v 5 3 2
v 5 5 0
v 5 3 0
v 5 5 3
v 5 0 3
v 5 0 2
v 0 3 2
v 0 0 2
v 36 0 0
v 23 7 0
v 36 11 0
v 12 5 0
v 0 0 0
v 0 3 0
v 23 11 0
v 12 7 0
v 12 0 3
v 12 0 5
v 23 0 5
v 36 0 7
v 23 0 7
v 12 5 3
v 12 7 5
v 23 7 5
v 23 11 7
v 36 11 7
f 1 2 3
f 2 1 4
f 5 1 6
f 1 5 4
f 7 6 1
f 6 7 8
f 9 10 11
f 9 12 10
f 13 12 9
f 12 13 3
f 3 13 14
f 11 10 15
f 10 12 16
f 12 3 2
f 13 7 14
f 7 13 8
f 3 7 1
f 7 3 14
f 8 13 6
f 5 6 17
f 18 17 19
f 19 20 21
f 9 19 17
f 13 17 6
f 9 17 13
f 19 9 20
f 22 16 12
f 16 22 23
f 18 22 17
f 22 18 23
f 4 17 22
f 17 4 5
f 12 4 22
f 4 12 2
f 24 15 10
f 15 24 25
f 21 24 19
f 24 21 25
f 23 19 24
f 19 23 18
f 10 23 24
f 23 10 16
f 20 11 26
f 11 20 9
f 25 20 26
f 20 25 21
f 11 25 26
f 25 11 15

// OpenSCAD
translate([2.5, 1.5, 1.0]) color([0.07533958521856021, 0.04464090542441246, 0.9342895823715677]) cube([5, 3, 2], center=true);
translate([2.5, 1.5, 1.0]) color([0.4861651007487351, 0.9010713996489047, 0.9447832518820701]) cube([5, 3, 2], center=true);
translate([2.5, 1.5, 1.0]) color([0.6665111524556335, 0.5717968260934746, 0.21597938410680917]) cube([5, 3, 2], center=true);
translate([2.5, 1.5, 1.0]) color([0.09347621929900818, 0.8193942150822732, 0.8887720676319878]) cube([5, 3, 2], center=true);
translate([2.5, 1.5, 1.0]) color([0.7793957106948857, 0.6985024327316249, 0.42011111607482077]) cube([5, 3, 2], center=true);
translate([2.5, 1.5, 1.0]) color([0.3053115900269564, 0.11344489563770899, 0.425970248072163]) cube([5, 3, 2], center=true);
translate([2.5, 1.5, 1.0]) color([0.5660129742477574, 0.9228805831375125, 0.9357547693309531]) cube([5, 3, 2], center=true);
translate([8.5, 2.5, 1.5]) color([0.41564119654091314, 0.0992109880980957, 0.7738187324714434]) cube([7, 5, 3], center=true);
translate([8.5, 2.5, 1.5]) color([0.7342793416571158, 0.03070084595190614, 0.4467185991338365]) cube([7, 5, 3], center=true);
translate([8.5, 2.5, 1.5]) color([0.6864181042985581, 0.030134234552269934, 0.9192823534016137]) cube([7, 5, 3], center=true);
translate([8.5, 2.5, 1.5]) color([0.9622424865104192, 0.72254277208884, 0.0785385396518038]) cube([7, 5, 3], center=true);
translate([8.5, 2.5, 1.5]) color([0.07032946587635569, 0.3592533148212369, 0.029377507756986443]) cube([7, 5, 3], center=true);
translate([8.5, 2.5, 1.5]) color([0.3478777272843395, 0.009964241312966027, 0.9743235128409679]) cube([7, 5, 3], center=true);
translate([8.5, 2.5, 1.5]) color([0.8190066990688627, 0.07051761147818736, 0.8934350918478603]) cube([7, 5, 3], center=true);
translate([8.5, 2.5, 1.5]) color([0.20797804000401565, 0.20479079826934998, 0.6737591455288341]) cube([7, 5, 3], center=true);
translate([8.5, 2.5, 1.5]) color([0.9382622681625481, 0.12318812122923739, 0.007184567252270457]) cube([7, 5, 3], center=true);
translate([8.5, 2.5, 1.5]) color([0.3691301471700257, 0.024650014436155776, 0.6048482375805311]) cube([7, 5, 3], center=true);
translate([8.5, 2.5, 1.5]) color([0.8591756086192088, 0.1869917024228578, 0.11239103583018406]) cube([7, 5, 3], center=true);
translate([17.5, 3.5, 2.5]) color([0.34444960733861085, 0.9591715206073138, 0.13015769442868408]) cube([11, 7, 5], center=true);
translate([17.5, 3.5, 2.5]) color([0.9665192604669938, 0.36223986994484925, 0.47337040276011155]) cube([11, 7, 5], center=true);
translate([17.5, 3.5, 2.5]) color([0.29263198596497353, 0.9371268442154698, 0.9581478949874975]) cube([11, 7, 5], center=true);
translate([17.5, 3.5, 2.5]) color([0.6359157065077434, 0.18404555017515556, 0.9929517886102871]) cube([11, 7, 5], center=true);
translate([17.5, 3.5, 2.5]) color([0.10258043954691198, 0.5808493815940804, 0.15640306008300875]) cube([11, 7, 5], center=true);
translate([17.5, 3.5, 2.5]) color([0.8976753141502056, 0.9456783914956152, 0.8043902980001079]) cube([11, 7, 5], center=true);
translate([17.5, 3.5, 2.5]) color([0.3158914186681244, 0.2428386899579852, 0.7548584132190378]) cube([11, 7, 5], center=true);
translate([17.5, 3.5, 2.5]) color([0.291059519145354, 0.4197853778540753, 0.04625567690264132]) cube([11, 7, 5], center=true);
translate([17.5, 3.5, 2.5]) color([0.13223381043380655, 0.020549620641776678, 0.0779211200935358]) cube([11, 7, 5], center=true);
translate([17.5, 3.5, 2.5]) color([0.07321114936486084, 0.42023170217414685, 0.5507771776374378]) cube([11, 7, 5], center=true);
translate([17.5, 3.5, 2.5]) color([0.740878819870922, 0.14228347384241602, 0.4221887461694188]) cube([11, 7, 5], center=true);
translate([17.5, 3.5, 2.5]) color([0.6369660374117204, 0.08455569481893255, 0.44481115514620384]) cube([11, 7, 5], center=true);
translate([17.5, 3.5, 2.5]) color([0.3692560392397978, 0.9489319289416618, 0.05785711390101722]) cube([11, 7, 5], center=true);
translate([29.5, 5.5, 3.5]) color([0.40862622118314806, 0.41722547979620506, 0.728180504599678]) cube([13, 11, 7], center=true);
translate([29.5, 5.5, 3.5]) color([0.3206710028745039, 0.20399027594623398, 0.2933116551663051]) cube([13, 11, 7], center=true);
translate([29.5, 5.5, 3.5]) color([0.4708875424493587, 0.9502683295716211, 0.7965170227633064]) cube([13, 11, 7], center=true);
translate([29.5, 5.5, 3.5]) color([0.2769702457797433, 0.5581815883930463, 0.6882003035685332]) cube([13, 11, 7], center=true);
translate([29.5, 5.5, 3.5]) color([0.7956571556821322, 0.4461643839498476, 0.398776905129706]) cube([13, 11, 7], center=true);
translate([29.5, 5.5, 3.5]) color([0.7676407428212785, 0.43171649556411207, 0.2479576688970051]) cube([13, 11, 7], center=true);
translate([29.5, 5.5, 3.5]) color([0.4534470315306477, 0.9371046462904561, 0.14256748821860132]) cube([13, 11, 7], center=true);
translate([29.5, 5.5, 3.5]) color([0.4624353545272121, 0.6373035243637815, 0.48328798826810027]) cube([13, 11, 7], center=true);
translate([29.5, 5.5, 3.5]) color([0.20363990437036994, 0.0018431606156659175, 0.698991711803439]) cube([13, 11, 7], center=true);
translate([29.5, 5.5, 3.5]) color([0.6187355180234525, 0.007776649435864202, 0.2985601210181208]) cube([13, 11, 7], center=true);
translate([29.5, 5.5, 3.5]) color([0.7686342595428415, 0.6289203785446209, 0.5452081159439722]) cube([13, 11, 7], center=true);
translate([29.5, 5.5, 3.5]) color([0.1562211098090489, 0.7062940429996885, 0.4714349217158037]) cube([13, 11, 7], center=true);
translate([29.5, 5.5, 3.5]) color([0.6781787462359636, 0.7600898367234922, 0.23236272144124515]) cube([13, 11, 7], center=true);
translate([29.5, 5.5, 3.5]) color([0.7619950130977117, 0.28008838468838926, 0.9840151371182455]) cube([13, 11, 7], center=true);
translate([29.5, 5.5, 3.5]) color([0.12083161078451865, 0.8837180187440564, 0.040547125043371324]) cube([13, 11, 7], center=true);
translate([29.5, 5.5, 3.5]) color([0.256575818348144, 0.5261019087624684, 0.5816161834445946]) cube([13, 11, 7], center=true);
translate([29.5, 5.5, 3.5]) color([0.3962349850280922, 0.10203172822707107, 0.2526080858247133]) cube([13, 11, 7], center=true);
